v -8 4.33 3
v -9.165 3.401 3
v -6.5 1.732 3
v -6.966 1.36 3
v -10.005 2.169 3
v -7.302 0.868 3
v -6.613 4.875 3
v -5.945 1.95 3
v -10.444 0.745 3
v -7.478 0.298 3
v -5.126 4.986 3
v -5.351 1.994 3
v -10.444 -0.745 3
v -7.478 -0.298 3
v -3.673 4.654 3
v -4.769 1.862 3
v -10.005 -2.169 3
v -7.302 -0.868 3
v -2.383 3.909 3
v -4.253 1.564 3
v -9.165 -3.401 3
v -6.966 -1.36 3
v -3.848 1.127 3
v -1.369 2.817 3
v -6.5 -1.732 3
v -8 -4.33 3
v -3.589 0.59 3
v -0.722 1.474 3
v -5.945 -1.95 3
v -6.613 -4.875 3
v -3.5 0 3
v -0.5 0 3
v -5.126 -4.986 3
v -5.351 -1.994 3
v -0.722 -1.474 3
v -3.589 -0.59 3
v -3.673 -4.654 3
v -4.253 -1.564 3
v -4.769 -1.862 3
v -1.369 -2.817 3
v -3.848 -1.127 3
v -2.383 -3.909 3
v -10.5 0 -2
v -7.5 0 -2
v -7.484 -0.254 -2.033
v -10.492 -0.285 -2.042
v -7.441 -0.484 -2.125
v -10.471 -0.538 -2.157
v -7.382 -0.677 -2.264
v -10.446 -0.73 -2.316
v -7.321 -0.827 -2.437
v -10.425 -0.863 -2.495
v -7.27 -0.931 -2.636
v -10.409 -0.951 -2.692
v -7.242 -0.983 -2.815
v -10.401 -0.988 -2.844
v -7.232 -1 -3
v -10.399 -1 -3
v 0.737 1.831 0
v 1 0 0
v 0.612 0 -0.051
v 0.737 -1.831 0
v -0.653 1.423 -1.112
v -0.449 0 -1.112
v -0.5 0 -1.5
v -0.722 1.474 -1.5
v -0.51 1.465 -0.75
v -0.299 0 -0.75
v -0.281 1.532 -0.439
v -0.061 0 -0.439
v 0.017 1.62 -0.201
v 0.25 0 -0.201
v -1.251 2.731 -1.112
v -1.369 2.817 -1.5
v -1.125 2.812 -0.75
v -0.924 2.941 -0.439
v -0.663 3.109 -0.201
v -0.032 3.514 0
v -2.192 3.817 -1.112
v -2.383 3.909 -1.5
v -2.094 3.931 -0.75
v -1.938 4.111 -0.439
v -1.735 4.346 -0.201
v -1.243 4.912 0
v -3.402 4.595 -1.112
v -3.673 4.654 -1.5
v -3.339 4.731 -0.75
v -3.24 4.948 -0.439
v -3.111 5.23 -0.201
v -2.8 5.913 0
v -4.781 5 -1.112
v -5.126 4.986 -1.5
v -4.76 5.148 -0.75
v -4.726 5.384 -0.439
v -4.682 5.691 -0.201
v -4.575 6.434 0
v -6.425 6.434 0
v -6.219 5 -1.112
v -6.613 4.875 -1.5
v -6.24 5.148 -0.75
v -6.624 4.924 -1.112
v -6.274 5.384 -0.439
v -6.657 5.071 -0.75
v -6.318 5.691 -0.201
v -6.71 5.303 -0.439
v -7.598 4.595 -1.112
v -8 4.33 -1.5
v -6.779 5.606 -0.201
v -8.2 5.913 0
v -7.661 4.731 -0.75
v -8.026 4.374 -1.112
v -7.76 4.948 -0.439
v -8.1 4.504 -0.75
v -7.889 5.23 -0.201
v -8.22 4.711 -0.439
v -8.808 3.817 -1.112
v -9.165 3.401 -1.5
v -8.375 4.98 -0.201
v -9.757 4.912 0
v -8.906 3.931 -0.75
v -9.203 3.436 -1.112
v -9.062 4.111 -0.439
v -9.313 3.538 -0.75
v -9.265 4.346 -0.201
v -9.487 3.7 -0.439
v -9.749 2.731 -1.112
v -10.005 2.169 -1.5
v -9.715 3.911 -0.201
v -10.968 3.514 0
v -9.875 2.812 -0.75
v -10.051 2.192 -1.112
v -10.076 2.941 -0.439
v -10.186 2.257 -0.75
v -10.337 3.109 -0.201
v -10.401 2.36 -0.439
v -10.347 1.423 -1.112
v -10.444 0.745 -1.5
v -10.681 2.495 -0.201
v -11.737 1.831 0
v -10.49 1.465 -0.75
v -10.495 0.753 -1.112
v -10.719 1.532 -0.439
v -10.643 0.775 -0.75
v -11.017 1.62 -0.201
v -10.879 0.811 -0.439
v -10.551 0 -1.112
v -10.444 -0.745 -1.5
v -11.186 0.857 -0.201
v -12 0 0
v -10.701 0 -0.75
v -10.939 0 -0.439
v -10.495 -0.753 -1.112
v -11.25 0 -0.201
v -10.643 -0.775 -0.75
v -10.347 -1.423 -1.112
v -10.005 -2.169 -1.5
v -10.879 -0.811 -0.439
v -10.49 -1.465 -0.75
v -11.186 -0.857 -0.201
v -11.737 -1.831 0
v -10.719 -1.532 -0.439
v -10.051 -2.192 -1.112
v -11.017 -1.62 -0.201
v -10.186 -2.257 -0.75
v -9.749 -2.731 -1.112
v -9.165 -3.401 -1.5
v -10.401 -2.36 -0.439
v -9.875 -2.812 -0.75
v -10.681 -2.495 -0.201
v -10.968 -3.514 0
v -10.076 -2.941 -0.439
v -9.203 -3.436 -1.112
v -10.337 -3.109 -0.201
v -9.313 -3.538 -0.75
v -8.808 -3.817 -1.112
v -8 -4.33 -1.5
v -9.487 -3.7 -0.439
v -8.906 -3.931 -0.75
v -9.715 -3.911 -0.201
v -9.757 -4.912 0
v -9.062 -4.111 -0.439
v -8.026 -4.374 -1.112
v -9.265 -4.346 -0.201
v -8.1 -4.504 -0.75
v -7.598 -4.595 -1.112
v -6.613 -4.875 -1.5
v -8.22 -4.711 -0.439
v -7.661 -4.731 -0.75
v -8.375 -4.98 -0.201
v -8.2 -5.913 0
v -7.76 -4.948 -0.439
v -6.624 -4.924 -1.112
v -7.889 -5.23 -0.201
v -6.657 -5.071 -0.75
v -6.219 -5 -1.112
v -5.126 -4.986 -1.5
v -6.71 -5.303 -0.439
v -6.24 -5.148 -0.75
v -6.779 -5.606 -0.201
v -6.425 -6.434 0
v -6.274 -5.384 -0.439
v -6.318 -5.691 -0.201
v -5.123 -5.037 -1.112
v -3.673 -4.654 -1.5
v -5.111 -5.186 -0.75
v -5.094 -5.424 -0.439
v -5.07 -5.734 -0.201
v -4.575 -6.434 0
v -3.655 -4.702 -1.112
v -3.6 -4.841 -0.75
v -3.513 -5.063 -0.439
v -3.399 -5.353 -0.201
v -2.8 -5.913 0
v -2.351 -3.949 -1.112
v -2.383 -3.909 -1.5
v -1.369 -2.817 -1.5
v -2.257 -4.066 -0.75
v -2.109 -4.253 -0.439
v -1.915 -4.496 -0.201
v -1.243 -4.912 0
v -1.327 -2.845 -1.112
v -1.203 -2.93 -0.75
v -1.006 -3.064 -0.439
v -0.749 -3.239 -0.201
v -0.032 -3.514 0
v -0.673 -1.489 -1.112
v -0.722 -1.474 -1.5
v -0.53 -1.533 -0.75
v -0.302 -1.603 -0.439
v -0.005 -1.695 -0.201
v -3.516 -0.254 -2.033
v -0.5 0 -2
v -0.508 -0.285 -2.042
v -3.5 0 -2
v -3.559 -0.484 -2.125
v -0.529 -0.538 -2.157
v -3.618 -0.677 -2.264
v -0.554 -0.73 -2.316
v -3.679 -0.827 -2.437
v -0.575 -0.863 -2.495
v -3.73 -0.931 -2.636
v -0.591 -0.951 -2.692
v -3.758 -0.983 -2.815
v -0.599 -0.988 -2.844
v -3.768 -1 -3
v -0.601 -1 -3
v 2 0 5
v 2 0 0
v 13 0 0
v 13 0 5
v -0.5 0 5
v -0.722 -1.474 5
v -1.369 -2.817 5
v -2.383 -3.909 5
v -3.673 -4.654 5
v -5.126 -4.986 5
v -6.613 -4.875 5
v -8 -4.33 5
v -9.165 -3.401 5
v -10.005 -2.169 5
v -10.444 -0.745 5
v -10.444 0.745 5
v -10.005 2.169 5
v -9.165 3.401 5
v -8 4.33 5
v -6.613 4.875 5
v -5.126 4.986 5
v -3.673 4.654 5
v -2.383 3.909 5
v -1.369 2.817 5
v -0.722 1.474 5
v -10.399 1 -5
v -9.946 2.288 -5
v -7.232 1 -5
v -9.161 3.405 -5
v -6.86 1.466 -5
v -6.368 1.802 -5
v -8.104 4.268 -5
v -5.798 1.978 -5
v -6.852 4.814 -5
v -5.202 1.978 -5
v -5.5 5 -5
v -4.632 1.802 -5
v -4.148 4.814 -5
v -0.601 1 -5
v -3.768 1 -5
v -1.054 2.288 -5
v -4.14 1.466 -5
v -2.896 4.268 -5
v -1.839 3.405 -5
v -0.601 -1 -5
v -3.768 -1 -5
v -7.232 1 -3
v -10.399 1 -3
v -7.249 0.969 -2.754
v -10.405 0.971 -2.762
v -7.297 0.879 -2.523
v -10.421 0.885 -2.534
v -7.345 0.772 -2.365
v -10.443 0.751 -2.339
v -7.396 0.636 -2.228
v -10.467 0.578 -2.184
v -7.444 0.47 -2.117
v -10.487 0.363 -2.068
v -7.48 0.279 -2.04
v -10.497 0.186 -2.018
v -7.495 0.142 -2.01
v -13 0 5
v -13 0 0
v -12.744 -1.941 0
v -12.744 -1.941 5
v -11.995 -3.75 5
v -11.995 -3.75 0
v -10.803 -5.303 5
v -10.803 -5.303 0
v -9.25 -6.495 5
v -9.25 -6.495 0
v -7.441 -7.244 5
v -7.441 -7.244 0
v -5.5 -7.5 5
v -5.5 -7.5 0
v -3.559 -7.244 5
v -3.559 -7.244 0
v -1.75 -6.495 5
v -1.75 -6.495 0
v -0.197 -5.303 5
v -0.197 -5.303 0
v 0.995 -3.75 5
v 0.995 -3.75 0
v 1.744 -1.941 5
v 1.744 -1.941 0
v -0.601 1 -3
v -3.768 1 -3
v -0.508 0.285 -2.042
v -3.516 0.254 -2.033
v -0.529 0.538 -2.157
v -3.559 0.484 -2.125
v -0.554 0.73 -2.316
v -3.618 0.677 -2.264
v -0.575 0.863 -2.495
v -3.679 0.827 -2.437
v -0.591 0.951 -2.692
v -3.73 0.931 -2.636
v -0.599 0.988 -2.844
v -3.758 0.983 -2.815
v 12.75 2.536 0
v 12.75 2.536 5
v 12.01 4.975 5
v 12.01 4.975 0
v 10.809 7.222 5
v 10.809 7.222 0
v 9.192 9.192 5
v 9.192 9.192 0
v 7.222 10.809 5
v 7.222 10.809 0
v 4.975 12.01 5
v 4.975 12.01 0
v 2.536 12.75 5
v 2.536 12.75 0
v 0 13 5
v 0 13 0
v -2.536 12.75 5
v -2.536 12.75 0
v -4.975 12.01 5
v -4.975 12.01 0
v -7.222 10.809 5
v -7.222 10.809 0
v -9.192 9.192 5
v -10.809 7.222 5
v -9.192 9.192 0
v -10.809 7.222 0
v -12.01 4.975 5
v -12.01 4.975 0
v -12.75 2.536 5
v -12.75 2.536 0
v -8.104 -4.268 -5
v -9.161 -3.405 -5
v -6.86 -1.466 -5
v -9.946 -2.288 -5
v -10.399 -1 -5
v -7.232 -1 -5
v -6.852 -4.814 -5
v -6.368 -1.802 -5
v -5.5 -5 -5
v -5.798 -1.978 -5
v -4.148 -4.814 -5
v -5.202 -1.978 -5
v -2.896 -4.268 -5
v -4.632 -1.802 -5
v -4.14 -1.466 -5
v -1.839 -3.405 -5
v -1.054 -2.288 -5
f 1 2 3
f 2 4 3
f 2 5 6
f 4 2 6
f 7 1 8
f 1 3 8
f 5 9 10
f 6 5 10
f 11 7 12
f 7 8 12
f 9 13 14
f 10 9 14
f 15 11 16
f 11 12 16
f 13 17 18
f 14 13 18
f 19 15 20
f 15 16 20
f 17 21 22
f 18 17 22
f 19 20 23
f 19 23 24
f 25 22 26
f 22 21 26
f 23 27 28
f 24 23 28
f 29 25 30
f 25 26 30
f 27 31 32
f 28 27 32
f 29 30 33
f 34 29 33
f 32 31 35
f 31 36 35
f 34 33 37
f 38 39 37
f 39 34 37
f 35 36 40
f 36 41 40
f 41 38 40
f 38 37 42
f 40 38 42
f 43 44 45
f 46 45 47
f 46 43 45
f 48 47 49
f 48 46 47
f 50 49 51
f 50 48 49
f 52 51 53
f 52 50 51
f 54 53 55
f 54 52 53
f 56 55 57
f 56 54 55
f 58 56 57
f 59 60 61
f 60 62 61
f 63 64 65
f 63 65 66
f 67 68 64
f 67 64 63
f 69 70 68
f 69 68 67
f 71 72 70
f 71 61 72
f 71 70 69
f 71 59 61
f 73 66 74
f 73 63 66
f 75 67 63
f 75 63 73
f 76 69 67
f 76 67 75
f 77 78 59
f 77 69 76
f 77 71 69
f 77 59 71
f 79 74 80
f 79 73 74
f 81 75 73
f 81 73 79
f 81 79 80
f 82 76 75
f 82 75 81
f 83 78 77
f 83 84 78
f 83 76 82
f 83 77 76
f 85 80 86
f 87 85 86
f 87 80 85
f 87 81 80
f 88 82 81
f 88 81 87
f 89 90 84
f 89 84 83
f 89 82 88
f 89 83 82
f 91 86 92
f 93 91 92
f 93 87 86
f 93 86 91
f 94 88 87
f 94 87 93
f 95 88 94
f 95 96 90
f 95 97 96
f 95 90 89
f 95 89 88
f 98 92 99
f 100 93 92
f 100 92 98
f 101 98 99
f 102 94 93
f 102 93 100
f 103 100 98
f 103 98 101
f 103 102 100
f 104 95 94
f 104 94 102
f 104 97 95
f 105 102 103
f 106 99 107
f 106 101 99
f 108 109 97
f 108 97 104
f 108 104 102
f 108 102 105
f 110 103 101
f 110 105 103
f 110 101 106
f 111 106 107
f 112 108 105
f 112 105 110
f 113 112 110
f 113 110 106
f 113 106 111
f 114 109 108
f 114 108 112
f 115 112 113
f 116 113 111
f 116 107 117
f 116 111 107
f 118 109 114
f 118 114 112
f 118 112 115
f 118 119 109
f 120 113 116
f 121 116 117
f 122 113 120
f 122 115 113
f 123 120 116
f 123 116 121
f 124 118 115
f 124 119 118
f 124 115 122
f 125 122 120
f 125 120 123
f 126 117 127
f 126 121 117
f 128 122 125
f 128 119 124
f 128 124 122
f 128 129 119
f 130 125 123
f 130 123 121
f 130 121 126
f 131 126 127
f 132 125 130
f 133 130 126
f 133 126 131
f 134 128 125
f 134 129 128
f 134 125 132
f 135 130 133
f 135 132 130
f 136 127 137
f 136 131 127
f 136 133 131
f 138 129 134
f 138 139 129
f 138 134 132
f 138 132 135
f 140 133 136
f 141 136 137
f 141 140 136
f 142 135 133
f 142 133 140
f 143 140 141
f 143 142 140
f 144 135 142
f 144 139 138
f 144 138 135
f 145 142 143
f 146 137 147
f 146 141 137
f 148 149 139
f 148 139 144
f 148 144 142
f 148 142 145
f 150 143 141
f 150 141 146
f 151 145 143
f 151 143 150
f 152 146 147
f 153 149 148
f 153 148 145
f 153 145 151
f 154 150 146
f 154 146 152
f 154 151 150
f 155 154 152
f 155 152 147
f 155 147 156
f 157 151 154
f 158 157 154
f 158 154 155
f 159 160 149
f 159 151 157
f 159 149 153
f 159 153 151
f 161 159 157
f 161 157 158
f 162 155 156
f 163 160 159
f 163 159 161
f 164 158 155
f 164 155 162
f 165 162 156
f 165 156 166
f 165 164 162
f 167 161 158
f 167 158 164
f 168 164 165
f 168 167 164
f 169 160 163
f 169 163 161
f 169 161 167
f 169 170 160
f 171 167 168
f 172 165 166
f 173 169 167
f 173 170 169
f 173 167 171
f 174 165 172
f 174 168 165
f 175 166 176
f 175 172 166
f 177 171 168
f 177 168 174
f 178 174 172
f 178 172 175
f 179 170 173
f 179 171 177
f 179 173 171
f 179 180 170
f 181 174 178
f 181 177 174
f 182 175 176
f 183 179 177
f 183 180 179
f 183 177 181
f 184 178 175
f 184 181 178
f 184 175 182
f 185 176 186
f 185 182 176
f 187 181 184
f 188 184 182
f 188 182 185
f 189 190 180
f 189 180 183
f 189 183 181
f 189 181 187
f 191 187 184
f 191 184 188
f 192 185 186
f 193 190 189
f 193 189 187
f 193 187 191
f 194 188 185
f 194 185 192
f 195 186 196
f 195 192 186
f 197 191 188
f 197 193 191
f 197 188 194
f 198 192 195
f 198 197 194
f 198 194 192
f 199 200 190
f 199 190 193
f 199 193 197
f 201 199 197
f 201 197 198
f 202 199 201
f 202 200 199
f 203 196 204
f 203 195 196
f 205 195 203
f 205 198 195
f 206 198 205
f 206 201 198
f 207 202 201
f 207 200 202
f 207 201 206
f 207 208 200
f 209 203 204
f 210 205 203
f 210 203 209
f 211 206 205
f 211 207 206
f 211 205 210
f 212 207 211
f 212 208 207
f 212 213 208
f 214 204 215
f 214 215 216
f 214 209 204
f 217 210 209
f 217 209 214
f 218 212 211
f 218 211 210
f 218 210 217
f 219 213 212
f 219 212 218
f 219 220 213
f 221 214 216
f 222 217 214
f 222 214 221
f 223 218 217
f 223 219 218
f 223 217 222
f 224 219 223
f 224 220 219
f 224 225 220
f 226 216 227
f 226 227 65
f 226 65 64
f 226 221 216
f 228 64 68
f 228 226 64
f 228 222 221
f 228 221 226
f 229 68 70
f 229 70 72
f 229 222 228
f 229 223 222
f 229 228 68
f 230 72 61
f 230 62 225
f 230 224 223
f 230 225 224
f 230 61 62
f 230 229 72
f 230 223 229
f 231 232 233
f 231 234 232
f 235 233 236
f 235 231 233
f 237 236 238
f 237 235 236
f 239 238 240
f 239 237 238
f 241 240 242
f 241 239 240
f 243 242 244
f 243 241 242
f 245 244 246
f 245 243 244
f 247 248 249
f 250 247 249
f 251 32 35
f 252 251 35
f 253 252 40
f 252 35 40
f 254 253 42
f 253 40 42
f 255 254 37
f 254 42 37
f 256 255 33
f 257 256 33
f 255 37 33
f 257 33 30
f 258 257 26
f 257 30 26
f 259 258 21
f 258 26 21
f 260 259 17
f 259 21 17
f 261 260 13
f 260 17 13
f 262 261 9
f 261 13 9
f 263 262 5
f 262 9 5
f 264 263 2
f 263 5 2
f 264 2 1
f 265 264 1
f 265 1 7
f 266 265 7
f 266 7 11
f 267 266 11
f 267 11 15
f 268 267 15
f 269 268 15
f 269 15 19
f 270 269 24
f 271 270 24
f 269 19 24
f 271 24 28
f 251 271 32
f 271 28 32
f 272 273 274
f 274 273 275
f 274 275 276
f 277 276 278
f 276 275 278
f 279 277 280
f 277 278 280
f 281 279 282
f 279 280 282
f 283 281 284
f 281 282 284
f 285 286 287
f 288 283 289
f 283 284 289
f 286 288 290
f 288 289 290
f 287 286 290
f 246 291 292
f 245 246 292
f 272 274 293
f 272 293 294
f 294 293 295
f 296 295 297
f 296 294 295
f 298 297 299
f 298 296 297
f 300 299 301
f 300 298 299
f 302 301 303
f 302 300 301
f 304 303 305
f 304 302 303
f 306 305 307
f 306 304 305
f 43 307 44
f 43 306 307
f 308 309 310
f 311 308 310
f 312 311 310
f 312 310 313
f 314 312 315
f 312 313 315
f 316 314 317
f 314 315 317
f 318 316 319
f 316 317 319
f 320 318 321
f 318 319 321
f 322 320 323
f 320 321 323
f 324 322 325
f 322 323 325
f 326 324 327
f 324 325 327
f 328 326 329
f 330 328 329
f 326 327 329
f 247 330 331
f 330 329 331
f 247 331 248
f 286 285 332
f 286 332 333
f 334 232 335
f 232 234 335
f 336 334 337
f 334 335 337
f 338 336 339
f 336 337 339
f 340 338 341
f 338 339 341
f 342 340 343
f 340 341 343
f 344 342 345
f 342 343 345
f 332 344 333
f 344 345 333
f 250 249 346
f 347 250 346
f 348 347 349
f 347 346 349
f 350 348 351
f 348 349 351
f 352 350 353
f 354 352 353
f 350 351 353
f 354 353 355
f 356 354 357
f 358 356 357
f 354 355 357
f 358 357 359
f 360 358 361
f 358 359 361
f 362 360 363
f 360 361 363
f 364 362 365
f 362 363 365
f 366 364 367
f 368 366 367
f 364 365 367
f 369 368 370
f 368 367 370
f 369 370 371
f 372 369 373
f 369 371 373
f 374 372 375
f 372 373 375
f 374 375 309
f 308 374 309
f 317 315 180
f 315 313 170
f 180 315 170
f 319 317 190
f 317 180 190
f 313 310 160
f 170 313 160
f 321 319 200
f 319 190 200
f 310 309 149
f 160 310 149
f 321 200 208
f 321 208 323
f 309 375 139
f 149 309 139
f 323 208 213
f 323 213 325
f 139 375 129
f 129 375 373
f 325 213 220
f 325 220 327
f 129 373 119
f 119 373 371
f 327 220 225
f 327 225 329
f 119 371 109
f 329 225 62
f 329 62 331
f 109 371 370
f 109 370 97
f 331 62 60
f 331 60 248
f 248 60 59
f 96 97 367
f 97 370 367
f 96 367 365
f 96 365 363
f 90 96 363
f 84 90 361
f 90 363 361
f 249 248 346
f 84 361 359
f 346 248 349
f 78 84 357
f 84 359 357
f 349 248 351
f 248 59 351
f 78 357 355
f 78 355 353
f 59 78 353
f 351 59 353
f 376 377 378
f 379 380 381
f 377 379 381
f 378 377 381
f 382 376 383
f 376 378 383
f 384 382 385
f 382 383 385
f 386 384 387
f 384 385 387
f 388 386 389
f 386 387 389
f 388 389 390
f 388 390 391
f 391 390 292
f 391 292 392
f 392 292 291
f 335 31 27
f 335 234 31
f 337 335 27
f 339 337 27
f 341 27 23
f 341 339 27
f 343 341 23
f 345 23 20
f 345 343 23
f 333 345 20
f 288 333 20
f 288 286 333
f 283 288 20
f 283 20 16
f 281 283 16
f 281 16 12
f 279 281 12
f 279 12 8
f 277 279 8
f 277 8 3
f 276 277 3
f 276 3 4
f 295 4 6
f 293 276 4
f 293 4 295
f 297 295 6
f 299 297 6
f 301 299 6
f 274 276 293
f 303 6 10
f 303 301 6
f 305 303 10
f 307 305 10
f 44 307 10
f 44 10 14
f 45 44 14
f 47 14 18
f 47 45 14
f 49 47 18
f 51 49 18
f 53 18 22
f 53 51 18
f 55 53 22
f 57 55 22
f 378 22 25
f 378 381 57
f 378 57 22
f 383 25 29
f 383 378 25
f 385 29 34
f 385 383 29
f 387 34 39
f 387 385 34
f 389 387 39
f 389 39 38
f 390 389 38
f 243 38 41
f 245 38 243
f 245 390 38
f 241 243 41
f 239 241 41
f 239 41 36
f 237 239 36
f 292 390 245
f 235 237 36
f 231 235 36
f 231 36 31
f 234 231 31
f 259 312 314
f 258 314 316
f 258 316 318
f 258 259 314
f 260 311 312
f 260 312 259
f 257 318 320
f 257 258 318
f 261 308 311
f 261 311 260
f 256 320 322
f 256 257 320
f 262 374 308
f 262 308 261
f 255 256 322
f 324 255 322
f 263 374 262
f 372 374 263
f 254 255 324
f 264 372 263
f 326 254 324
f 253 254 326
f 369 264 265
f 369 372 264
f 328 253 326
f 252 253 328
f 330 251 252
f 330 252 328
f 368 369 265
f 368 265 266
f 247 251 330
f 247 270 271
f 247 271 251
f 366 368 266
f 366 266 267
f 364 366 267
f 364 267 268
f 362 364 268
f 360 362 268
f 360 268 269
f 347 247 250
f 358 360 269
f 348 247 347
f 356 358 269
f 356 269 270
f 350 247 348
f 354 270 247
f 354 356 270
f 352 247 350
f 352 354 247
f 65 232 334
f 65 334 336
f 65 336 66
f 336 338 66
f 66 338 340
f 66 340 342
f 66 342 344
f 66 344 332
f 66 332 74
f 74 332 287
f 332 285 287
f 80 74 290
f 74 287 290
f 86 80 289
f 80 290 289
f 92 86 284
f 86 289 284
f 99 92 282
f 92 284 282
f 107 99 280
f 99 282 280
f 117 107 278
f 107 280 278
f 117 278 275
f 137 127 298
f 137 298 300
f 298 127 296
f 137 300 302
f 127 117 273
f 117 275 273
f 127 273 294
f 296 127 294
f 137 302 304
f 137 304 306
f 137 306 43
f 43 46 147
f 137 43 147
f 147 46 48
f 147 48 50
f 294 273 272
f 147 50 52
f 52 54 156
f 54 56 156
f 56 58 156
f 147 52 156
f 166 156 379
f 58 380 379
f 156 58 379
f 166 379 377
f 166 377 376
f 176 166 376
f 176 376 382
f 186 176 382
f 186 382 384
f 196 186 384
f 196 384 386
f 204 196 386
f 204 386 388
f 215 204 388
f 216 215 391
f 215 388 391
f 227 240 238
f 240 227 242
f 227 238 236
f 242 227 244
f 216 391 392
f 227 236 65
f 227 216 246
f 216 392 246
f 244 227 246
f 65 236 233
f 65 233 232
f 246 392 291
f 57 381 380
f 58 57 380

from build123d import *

# Parameters (mm, degrees)
SKETCH1_R           = 2
BOSS_EXTRUDE1_DEPTH = 5
BOSS_EXTRUDE2_START = -5
SKETCH3_R           = 5
SKETCH3_R_2         = 2
BOSS_EXTRUDE2_DEPTH = 5
SKETCH4_W           = 13.002851436
SKETCH4_H           = 2
CUT_EXTRUDE1_DEPTH  = 3
FILLET1_R           = 1
CUT_EXTRUDE2_START  = 2
SKETCH5_R           = 5
CUT_EXTRUDE2_DEPTH  = 2
FILLET2_R           = 1.5


with BuildPart() as part:
    # Sketch1 → Boss-Extrude1 (new body)
    with BuildSketch(Plane.XY):
        with BuildLine():
            Line((2, 0), (13, 0))
            ThreePointArc((13, 0), (0, 13), (-13, 0))
            ThreePointArc((-13, 0), (-5.5, -7.5), (2, 0))
        make_face()
        with Locations((-5.5, 0)):
            Circle(SKETCH1_R, mode=Mode.SUBTRACT)
    extrude(amount=BOSS_EXTRUDE1_DEPTH)

    # Sketch3 → Boss-Extrude2 (add)
    with BuildSketch(Plane.XY.offset(BOSS_EXTRUDE2_START)):
        with Locations((-5.5, 0)):
            Circle(SKETCH3_R)
        with Locations((-5.5, 0)):
            Circle(SKETCH3_R_2, mode=Mode.SUBTRACT)
    extrude(amount=BOSS_EXTRUDE2_DEPTH)

    # Sketch4 → Cut-Extrude1 (cut)
    with BuildSketch(Plane(origin=(0, 0, -5), x_dir=(-1, 0, 0), z_dir=(0, 0, -1))):
        with Locations((5.5, 0)):
            Rectangle(SKETCH4_W, SKETCH4_H)
    extrude(amount=-CUT_EXTRUDE1_DEPTH, mode=Mode.SUBTRACT)

    # Fillet1
    fillet1_edges = [part.edges().sort_by_distance(p)[0] for p in [
        (-8.815515147, 1, -2),
        (-2.184484853, 1, -2),
        (-8.815515147, -1, -2),
        (-2.184484853, -1, -2),
    ]]
    fillet(fillet1_edges, radius=FILLET1_R - 0.0001)  # a hair under: the kernel refuses the full size

    # Sketch5 → Cut-Extrude2 (cut)
    with BuildSketch(Plane(origin=(0, 0, 5), x_dir=(-1, 0, 0), z_dir=(0, 0, -1)).offset(CUT_EXTRUDE2_START)):
        with Locations(Location((5.5, 0, 0), (0, 0, 180))):
            Circle(SKETCH5_R)
    extrude(amount=-CUT_EXTRUDE2_DEPTH, mode=Mode.SUBTRACT)

    # Fillet2
    fillet2_edges = [part.edges().sort_by_distance(p)[0] for p in [
        (-10.5, 0, 0),
    ]]
    fillet(fillet2_edges, radius=FILLET2_R)


solid = part.part
